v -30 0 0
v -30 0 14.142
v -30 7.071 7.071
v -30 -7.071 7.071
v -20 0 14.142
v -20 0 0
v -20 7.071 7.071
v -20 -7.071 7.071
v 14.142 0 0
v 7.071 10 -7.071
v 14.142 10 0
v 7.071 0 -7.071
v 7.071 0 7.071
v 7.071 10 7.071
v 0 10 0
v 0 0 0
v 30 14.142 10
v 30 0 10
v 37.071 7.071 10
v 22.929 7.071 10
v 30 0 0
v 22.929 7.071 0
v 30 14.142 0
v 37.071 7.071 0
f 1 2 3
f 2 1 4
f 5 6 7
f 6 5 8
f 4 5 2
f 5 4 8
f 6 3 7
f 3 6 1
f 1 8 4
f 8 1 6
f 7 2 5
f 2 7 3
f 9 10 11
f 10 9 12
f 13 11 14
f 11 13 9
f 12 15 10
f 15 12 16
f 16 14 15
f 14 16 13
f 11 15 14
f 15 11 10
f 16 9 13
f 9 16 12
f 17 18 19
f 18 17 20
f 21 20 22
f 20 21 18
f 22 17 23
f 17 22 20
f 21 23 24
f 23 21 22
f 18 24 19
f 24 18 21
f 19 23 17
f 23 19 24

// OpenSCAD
// file: ../../lib/utilities/transform_rotate.scad
// lib/utilities/transform_rotate.scad

/**
 * Rotates an object around the x-axis.
 *
 * @param angle Angle to rotate in degrees.
 */
module rotateX(angle) {
    rotate([angle, 0, 0])
    children();
}

/**
 * Rotates an object around the y-axis.
 *
 * @param angle Angle to rotate in degrees.
 */
module rotateY(angle) {
    rotate([0, angle, 0])
    children();
}

/**
 * Rotates an object around the z-axis.
 *
 * @param angle Angle to rotate in degrees.
 */
module rotateZ(angle) {
    rotate([0, 0, angle])
    children();
}
// main file
// tests/utilities/test_transform_rotate.scad

use <../../lib/utilities/transform_rotate.scad>

module testTransformRotate() {
    translate([-30, 0, 0])
    rotateX(45)
    cube([10, 10, 10]);

    translate([0, 0, 0])
    rotateY(45)
    cube([10, 10, 10]);

    translate([30, 0, 0])
    rotateZ(45)
    cube([10, 10, 10]);
}

testTransformRotate();
